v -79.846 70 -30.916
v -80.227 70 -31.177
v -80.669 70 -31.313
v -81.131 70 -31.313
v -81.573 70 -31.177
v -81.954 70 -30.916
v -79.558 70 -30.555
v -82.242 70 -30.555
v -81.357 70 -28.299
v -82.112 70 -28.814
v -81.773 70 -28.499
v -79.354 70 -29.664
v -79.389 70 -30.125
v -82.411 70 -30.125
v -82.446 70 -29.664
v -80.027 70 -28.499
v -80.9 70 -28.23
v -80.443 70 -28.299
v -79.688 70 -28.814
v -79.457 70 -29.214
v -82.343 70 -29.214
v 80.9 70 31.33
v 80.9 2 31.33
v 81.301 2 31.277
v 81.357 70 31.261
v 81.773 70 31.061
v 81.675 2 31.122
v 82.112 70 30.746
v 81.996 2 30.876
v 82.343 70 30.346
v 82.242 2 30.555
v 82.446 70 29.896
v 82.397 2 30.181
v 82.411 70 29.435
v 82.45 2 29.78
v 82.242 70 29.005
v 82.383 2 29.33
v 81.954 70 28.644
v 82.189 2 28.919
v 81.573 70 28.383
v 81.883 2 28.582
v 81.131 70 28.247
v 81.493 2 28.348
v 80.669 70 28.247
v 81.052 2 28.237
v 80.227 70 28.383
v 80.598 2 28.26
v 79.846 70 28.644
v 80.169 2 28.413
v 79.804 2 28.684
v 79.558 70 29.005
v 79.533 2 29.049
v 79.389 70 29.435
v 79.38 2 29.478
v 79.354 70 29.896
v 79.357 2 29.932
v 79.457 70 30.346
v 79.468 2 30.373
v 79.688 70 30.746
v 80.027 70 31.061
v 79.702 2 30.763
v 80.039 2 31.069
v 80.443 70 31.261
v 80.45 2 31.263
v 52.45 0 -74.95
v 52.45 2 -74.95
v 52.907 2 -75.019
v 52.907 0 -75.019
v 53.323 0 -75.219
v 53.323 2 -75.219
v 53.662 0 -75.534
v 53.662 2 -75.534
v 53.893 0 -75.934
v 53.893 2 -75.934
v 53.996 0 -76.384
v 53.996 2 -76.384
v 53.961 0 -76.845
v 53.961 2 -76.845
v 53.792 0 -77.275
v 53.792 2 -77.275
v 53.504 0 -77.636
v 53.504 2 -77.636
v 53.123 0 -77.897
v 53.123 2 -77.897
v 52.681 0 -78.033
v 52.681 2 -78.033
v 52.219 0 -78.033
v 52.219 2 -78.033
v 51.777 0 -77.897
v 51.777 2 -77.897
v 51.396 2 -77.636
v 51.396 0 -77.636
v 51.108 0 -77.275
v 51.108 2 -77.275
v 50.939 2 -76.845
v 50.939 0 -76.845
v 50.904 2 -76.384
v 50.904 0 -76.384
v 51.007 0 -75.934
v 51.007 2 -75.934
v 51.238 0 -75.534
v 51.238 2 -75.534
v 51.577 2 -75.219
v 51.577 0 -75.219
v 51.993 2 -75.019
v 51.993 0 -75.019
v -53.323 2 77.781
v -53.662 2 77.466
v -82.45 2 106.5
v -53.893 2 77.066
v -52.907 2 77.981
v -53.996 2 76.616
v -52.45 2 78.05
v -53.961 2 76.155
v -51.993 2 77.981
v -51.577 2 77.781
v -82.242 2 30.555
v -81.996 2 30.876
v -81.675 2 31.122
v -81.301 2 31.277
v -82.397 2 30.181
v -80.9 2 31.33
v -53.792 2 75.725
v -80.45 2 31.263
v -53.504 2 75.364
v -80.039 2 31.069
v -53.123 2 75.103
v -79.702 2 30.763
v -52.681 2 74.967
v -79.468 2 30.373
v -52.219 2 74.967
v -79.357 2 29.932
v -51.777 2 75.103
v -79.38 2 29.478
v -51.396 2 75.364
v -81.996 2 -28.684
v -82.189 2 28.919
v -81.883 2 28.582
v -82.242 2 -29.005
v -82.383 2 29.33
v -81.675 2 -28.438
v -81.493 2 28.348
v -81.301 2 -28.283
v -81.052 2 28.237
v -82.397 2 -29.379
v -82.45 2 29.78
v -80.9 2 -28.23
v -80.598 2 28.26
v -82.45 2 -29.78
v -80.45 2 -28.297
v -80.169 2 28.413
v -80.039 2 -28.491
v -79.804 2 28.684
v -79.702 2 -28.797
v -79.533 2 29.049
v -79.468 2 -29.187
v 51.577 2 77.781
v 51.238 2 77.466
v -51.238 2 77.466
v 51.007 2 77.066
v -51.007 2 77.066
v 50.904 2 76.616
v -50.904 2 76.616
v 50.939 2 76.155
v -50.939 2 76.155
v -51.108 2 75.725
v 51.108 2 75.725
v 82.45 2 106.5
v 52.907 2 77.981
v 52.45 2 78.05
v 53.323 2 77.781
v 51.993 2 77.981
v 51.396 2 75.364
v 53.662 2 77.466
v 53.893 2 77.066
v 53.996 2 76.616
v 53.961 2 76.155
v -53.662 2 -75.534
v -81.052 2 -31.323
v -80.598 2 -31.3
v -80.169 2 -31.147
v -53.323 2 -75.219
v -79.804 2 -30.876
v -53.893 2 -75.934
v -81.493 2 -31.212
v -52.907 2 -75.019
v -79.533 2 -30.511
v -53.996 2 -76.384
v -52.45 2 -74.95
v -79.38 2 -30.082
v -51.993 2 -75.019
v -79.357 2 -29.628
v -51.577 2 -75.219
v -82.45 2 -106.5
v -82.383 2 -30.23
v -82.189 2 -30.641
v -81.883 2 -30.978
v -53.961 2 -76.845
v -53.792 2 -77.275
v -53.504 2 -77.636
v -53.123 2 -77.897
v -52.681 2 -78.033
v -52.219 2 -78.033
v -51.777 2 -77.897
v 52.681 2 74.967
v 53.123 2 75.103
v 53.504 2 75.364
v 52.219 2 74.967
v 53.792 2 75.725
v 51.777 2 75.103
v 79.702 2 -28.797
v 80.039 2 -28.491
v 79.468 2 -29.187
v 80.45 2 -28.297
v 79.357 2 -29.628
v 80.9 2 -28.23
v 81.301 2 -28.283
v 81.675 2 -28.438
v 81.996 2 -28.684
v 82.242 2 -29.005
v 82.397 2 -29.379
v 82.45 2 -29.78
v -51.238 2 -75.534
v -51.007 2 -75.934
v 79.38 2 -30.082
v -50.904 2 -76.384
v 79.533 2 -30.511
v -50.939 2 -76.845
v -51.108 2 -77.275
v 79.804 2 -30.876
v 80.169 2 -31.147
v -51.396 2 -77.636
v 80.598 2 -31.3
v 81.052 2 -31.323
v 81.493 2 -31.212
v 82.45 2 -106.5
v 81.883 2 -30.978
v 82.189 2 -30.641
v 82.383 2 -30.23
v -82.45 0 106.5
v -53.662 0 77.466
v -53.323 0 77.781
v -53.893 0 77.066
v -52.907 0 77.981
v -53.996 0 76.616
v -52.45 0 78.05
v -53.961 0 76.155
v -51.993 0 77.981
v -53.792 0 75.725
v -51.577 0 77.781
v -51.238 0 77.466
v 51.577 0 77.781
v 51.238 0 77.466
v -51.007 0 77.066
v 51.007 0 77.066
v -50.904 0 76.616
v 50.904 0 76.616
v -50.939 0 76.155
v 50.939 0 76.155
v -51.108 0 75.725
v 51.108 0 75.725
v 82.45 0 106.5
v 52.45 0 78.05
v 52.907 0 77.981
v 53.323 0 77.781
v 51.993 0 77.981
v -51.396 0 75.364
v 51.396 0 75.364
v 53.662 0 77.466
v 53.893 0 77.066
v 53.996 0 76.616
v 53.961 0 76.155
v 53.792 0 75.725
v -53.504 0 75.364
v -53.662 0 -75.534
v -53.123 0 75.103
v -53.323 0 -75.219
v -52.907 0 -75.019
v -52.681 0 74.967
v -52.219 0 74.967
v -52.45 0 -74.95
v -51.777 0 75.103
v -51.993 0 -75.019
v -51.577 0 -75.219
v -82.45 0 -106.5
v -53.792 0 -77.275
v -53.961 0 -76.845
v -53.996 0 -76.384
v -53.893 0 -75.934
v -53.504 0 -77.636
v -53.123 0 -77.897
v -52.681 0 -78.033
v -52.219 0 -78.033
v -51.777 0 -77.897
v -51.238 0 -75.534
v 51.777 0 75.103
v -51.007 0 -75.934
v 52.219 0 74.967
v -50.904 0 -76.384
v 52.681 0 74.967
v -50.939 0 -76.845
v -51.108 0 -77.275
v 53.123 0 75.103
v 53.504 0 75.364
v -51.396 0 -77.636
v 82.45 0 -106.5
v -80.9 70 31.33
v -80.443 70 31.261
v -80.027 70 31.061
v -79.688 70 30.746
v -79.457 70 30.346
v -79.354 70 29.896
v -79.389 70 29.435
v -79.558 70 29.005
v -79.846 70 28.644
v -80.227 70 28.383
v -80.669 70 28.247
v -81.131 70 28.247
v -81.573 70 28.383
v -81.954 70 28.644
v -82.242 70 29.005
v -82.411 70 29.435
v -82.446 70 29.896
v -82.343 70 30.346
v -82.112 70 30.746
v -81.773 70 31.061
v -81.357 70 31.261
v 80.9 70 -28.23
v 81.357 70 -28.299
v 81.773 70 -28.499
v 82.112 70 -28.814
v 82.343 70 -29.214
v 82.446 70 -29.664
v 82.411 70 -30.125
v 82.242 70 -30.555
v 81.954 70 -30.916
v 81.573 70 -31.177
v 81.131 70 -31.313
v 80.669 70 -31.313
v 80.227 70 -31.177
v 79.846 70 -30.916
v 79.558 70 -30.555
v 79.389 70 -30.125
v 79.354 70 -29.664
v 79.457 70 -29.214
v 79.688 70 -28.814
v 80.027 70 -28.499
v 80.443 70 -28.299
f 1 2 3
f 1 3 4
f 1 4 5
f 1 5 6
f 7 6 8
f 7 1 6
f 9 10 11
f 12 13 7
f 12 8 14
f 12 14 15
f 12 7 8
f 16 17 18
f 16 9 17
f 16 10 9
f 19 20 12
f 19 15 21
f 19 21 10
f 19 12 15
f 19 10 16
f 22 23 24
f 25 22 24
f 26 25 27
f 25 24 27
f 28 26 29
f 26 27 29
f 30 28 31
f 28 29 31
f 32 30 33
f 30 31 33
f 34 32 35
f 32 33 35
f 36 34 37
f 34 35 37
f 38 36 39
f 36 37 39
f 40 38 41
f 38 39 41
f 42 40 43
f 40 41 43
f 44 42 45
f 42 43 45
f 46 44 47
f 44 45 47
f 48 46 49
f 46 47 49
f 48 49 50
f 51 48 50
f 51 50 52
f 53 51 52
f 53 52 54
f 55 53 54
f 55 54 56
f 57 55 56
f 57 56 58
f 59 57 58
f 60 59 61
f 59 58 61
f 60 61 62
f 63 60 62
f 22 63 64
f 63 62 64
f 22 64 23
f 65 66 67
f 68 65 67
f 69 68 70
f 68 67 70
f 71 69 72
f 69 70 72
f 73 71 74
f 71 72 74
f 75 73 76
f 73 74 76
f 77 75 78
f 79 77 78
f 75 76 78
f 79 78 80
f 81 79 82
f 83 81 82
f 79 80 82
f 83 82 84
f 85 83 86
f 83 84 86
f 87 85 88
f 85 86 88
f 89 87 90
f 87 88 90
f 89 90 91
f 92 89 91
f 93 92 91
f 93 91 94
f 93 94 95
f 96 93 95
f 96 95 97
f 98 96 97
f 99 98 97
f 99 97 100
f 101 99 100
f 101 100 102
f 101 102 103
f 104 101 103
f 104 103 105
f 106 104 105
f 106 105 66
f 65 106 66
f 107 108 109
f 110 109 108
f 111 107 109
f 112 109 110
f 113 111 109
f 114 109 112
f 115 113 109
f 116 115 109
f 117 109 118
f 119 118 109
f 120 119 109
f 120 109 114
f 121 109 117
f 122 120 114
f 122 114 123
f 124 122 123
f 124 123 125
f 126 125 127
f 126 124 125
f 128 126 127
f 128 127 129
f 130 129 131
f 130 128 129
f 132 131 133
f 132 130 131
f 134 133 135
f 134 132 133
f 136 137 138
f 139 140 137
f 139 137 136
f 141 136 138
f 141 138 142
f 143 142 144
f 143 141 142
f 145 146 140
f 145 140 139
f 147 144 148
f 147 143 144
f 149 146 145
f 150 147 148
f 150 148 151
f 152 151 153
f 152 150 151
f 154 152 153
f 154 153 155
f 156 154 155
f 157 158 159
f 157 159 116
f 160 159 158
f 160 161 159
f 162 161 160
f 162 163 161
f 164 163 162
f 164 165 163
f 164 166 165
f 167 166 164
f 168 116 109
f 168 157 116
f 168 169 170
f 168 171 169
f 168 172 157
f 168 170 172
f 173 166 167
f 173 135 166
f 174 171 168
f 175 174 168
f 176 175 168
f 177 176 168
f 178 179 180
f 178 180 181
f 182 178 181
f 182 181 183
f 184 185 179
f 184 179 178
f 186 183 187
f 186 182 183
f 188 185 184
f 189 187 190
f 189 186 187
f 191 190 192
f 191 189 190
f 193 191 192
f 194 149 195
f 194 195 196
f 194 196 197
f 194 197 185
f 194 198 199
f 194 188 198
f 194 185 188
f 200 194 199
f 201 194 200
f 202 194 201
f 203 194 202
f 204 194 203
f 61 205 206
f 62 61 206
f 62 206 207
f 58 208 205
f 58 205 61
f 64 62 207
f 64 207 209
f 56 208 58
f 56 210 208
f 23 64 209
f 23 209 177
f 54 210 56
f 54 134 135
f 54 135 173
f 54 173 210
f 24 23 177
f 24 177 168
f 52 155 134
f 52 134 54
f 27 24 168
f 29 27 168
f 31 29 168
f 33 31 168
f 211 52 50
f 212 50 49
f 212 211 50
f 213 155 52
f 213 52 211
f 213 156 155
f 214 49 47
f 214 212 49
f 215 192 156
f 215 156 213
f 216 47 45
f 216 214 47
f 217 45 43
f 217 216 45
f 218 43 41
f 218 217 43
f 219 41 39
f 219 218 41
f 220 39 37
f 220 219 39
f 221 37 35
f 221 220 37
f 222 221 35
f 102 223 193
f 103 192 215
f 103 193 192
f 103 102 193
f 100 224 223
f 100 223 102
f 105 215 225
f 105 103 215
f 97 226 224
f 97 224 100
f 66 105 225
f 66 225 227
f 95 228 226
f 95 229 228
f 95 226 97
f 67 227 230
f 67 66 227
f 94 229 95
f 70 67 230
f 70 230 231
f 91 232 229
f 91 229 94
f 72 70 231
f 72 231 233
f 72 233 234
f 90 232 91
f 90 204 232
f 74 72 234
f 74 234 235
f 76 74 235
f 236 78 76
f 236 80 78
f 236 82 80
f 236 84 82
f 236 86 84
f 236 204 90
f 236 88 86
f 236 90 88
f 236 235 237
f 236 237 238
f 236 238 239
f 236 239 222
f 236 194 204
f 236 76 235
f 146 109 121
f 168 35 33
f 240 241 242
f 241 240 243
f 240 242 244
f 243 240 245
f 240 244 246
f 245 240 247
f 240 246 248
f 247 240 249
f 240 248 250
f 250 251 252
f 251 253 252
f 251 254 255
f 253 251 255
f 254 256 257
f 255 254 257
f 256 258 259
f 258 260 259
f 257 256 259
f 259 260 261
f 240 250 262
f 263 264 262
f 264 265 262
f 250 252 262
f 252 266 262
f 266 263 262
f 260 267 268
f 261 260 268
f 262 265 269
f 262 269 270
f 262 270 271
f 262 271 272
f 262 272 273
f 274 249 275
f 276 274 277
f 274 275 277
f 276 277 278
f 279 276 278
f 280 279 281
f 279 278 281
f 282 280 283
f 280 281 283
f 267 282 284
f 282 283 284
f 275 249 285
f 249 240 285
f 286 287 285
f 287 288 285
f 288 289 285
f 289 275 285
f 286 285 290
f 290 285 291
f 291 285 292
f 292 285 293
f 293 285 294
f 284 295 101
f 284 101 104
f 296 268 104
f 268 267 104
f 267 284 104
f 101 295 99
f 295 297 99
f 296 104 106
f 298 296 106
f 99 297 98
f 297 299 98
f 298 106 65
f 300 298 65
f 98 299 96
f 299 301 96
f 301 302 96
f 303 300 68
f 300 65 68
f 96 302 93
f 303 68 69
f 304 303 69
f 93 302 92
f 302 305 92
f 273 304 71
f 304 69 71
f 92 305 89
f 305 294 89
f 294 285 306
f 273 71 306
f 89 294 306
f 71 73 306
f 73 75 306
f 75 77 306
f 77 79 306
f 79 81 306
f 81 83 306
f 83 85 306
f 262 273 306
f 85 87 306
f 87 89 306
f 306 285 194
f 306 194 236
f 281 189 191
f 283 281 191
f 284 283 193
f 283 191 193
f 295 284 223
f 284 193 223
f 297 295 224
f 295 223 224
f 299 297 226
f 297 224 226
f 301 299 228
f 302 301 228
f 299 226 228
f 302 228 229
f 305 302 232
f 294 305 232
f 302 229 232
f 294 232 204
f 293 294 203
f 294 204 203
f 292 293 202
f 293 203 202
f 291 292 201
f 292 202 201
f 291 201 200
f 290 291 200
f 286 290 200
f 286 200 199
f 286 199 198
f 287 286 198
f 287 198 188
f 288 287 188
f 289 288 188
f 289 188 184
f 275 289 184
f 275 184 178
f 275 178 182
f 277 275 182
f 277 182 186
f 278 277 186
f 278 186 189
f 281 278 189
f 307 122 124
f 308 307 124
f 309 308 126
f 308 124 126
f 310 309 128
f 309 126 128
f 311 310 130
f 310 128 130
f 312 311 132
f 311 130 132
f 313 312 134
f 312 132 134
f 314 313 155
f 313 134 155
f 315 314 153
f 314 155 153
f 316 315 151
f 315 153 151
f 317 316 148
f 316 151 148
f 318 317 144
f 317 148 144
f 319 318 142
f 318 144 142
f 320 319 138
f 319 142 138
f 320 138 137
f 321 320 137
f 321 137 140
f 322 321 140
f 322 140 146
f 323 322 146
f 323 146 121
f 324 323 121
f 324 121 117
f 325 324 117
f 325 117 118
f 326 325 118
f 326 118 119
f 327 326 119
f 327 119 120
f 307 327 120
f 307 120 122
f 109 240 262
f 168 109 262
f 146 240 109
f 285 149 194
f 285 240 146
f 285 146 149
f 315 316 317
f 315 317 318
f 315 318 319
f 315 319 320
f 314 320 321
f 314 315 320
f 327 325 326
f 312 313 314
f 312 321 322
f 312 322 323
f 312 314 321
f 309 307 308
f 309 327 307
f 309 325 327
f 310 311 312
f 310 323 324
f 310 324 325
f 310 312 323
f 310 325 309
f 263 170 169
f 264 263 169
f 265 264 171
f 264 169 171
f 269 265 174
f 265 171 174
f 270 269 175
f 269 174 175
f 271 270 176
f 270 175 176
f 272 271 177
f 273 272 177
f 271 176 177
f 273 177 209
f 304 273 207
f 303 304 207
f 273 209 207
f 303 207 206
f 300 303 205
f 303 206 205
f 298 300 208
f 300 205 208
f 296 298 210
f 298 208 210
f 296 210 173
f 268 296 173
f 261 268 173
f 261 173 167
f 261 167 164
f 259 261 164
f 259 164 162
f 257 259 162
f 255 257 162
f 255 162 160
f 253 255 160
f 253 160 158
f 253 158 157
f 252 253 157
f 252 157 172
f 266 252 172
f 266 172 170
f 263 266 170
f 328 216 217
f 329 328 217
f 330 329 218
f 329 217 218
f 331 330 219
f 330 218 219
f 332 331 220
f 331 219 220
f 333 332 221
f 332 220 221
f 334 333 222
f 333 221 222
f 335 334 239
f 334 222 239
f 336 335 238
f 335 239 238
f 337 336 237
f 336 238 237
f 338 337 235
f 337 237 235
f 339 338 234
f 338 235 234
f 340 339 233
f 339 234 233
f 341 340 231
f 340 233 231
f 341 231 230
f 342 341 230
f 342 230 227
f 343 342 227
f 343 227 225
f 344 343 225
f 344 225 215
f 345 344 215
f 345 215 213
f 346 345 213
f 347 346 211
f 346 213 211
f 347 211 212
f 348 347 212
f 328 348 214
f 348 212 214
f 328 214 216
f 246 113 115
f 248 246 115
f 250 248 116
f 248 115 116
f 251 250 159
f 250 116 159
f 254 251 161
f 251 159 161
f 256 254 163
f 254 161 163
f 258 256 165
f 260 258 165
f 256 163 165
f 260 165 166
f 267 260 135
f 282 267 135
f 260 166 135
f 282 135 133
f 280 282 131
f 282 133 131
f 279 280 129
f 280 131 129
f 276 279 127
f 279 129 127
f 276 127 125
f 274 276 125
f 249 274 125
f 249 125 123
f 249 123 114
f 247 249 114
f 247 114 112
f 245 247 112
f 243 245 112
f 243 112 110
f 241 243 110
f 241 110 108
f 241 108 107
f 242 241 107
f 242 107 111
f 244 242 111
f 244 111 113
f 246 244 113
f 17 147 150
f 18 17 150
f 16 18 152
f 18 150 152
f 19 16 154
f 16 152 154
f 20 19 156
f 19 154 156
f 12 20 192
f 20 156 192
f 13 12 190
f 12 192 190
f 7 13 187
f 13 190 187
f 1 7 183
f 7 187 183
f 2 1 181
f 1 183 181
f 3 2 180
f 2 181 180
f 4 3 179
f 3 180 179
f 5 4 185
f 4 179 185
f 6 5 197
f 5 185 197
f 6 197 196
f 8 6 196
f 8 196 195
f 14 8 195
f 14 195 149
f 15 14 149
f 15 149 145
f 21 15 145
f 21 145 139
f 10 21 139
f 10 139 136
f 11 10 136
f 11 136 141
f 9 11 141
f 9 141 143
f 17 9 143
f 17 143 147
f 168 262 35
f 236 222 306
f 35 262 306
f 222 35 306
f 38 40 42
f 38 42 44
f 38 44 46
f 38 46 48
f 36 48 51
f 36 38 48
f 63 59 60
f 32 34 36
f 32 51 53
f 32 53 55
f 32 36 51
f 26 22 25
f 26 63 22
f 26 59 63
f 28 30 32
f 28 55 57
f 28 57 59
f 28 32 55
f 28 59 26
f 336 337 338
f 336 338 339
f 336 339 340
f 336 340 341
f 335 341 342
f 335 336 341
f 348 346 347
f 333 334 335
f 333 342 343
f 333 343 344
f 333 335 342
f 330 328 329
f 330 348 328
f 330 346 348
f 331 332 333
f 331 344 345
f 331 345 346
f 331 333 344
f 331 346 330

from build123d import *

# Parameters (mm, degrees)
SKETCH1_R             = 1.55
BOSS_EXTRUDE1_DEPTH   = 70
BOSS_EXTRUDE1_2_DEPTH = 70
BOSS_EXTRUDE1_3_DEPTH = 70
BOSS_EXTRUDE1_4_DEPTH = 70
SKETCH2_W             = 164.9
SKETCH2_H             = 213
BOSS_EXTRUDE2_DEPTH   = 2
SKETCH3_R             = 1.55
CUT_EXTRUDE1_DEPTH    = 10


with BuildPart() as part:
    # Sketch1 → Boss-Extrude1 (new body)
    with BuildSketch(Plane(origin=(0, 0, 0), x_dir=(1, 0, 0), z_dir=(0, 1, 0))):
        with Locations(Location((-80.9, 29.78, 0), (0, 0, 270))):
            Circle(SKETCH1_R)
    extrude(amount=BOSS_EXTRUDE1_DEPTH)



with BuildPart() as body_2:
    # Sketch1 → Boss-Extrude1 2 (new body)
    with BuildSketch(Plane(origin=(0, 0, 0), x_dir=(1, 0, 0), z_dir=(0, 1, 0))):
        with Locations(Location((-80.9, -29.78, 0), (0, 0, 270))):
            Circle(SKETCH1_R)
    extrude(amount=BOSS_EXTRUDE1_2_DEPTH)


with BuildPart() as body_3:
    # Sketch1 → Boss-Extrude1 3 (new body)
    with BuildSketch(Plane(origin=(0, 0, 0), x_dir=(1, 0, 0), z_dir=(0, 1, 0))):
        with Locations(Location((80.9, 29.78, 0), (0, 0, 270))):
            Circle(SKETCH1_R)
    extrude(amount=BOSS_EXTRUDE1_3_DEPTH)


with BuildPart() as body_4:
    # Sketch1 → Boss-Extrude1 4 (new body)
    with BuildSketch(Plane(origin=(0, 0, 0), x_dir=(1, 0, 0), z_dir=(0, 1, 0))):
        with Locations(Location((80.9, -29.78, 0), (0, 0, 270))):
            Circle(SKETCH1_R)
    extrude(amount=BOSS_EXTRUDE1_4_DEPTH)


with BuildPart() as part_1:
    add(part.part)

    add(body_2.part)  # Boss-Extrude2 merges body 2

    add(body_3.part)  # Boss-Extrude2 merges body 3

    add(body_4.part)  # Boss-Extrude2 merges body 4
    # Sketch2 → Boss-Extrude2 (add)
    with BuildSketch(Plane(origin=(0, 0, 0), x_dir=(1, 0, 0), z_dir=(0, 1, 0))):
        Rectangle(SKETCH2_W, SKETCH2_H)
    extrude(amount=BOSS_EXTRUDE2_DEPTH)

    # Sketch3 → Cut-Extrude1 (cut)
    with BuildSketch(Plane(origin=(0, 2, 0), x_dir=(1, 0, 0), z_dir=(0, 1, 0))):
        with Locations(Location((-52.45, 76.5, 0), (0, 0, 270))):
            Circle(SKETCH3_R)
        with Locations(Location((52.45, 76.5, 0), (0, 0, 270))):
            Circle(SKETCH3_R)
        with Locations(Location((52.45, -76.5, 0), (0, 0, 270))):
            Circle(SKETCH3_R)
        with Locations(Location((-52.45, -76.5, 0), (0, 0, 270))):
            Circle(SKETCH3_R)
    extrude(amount=-CUT_EXTRUDE1_DEPTH, mode=Mode.SUBTRACT)


solid = part_1.part
